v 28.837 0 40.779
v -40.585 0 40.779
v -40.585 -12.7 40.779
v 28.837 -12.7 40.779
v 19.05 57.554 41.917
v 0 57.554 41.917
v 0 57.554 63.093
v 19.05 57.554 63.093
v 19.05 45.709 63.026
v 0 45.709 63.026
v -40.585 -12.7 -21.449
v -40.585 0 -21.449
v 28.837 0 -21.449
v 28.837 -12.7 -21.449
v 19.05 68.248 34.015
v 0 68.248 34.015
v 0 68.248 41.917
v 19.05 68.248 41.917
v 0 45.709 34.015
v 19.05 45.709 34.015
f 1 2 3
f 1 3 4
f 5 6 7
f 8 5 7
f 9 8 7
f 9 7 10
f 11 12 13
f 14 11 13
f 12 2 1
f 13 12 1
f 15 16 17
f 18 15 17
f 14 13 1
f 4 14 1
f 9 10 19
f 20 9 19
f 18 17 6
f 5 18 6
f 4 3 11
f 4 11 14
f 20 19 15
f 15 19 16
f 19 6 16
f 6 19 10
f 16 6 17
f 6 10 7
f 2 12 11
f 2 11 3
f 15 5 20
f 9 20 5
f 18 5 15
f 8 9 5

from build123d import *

# Parameters (mm, degrees)
F0_W     = 69.4220066071
F0_H     = 62.2280314565
F3_DEPTH = 12.7
F5_DEPTH = 19.05


# Not quite as in the source:
# - the program builds the solid bodies; features that only make, move or delete a surface that nothing else refers to are left out


with BuildPart() as f3:
    # F0 (on Front) → F3 (new body)
    with BuildSketch(Plane.XZ):
        with Locations((-5.8741644025, 9.6652619541)):
            Rectangle(F0_W, F0_H)
    extrude(amount=F3_DEPTH)


with BuildPart() as f5:
    # F4 (on Right) → F5 (new body)
    with BuildSketch(Plane.YZ):
        Polygon((57.5543679297, 63.0933269858), (45.7089096308, 63.025817275), (45.7089096308, 34.0147763491), (68.2484209538, 34.0147763491), (68.2484209538, 41.9166460633), (57.5543679297, 41.9166460633), align=None)
    extrude(amount=F5_DEPTH)


solid = Compound([f3.part, f5.part])
